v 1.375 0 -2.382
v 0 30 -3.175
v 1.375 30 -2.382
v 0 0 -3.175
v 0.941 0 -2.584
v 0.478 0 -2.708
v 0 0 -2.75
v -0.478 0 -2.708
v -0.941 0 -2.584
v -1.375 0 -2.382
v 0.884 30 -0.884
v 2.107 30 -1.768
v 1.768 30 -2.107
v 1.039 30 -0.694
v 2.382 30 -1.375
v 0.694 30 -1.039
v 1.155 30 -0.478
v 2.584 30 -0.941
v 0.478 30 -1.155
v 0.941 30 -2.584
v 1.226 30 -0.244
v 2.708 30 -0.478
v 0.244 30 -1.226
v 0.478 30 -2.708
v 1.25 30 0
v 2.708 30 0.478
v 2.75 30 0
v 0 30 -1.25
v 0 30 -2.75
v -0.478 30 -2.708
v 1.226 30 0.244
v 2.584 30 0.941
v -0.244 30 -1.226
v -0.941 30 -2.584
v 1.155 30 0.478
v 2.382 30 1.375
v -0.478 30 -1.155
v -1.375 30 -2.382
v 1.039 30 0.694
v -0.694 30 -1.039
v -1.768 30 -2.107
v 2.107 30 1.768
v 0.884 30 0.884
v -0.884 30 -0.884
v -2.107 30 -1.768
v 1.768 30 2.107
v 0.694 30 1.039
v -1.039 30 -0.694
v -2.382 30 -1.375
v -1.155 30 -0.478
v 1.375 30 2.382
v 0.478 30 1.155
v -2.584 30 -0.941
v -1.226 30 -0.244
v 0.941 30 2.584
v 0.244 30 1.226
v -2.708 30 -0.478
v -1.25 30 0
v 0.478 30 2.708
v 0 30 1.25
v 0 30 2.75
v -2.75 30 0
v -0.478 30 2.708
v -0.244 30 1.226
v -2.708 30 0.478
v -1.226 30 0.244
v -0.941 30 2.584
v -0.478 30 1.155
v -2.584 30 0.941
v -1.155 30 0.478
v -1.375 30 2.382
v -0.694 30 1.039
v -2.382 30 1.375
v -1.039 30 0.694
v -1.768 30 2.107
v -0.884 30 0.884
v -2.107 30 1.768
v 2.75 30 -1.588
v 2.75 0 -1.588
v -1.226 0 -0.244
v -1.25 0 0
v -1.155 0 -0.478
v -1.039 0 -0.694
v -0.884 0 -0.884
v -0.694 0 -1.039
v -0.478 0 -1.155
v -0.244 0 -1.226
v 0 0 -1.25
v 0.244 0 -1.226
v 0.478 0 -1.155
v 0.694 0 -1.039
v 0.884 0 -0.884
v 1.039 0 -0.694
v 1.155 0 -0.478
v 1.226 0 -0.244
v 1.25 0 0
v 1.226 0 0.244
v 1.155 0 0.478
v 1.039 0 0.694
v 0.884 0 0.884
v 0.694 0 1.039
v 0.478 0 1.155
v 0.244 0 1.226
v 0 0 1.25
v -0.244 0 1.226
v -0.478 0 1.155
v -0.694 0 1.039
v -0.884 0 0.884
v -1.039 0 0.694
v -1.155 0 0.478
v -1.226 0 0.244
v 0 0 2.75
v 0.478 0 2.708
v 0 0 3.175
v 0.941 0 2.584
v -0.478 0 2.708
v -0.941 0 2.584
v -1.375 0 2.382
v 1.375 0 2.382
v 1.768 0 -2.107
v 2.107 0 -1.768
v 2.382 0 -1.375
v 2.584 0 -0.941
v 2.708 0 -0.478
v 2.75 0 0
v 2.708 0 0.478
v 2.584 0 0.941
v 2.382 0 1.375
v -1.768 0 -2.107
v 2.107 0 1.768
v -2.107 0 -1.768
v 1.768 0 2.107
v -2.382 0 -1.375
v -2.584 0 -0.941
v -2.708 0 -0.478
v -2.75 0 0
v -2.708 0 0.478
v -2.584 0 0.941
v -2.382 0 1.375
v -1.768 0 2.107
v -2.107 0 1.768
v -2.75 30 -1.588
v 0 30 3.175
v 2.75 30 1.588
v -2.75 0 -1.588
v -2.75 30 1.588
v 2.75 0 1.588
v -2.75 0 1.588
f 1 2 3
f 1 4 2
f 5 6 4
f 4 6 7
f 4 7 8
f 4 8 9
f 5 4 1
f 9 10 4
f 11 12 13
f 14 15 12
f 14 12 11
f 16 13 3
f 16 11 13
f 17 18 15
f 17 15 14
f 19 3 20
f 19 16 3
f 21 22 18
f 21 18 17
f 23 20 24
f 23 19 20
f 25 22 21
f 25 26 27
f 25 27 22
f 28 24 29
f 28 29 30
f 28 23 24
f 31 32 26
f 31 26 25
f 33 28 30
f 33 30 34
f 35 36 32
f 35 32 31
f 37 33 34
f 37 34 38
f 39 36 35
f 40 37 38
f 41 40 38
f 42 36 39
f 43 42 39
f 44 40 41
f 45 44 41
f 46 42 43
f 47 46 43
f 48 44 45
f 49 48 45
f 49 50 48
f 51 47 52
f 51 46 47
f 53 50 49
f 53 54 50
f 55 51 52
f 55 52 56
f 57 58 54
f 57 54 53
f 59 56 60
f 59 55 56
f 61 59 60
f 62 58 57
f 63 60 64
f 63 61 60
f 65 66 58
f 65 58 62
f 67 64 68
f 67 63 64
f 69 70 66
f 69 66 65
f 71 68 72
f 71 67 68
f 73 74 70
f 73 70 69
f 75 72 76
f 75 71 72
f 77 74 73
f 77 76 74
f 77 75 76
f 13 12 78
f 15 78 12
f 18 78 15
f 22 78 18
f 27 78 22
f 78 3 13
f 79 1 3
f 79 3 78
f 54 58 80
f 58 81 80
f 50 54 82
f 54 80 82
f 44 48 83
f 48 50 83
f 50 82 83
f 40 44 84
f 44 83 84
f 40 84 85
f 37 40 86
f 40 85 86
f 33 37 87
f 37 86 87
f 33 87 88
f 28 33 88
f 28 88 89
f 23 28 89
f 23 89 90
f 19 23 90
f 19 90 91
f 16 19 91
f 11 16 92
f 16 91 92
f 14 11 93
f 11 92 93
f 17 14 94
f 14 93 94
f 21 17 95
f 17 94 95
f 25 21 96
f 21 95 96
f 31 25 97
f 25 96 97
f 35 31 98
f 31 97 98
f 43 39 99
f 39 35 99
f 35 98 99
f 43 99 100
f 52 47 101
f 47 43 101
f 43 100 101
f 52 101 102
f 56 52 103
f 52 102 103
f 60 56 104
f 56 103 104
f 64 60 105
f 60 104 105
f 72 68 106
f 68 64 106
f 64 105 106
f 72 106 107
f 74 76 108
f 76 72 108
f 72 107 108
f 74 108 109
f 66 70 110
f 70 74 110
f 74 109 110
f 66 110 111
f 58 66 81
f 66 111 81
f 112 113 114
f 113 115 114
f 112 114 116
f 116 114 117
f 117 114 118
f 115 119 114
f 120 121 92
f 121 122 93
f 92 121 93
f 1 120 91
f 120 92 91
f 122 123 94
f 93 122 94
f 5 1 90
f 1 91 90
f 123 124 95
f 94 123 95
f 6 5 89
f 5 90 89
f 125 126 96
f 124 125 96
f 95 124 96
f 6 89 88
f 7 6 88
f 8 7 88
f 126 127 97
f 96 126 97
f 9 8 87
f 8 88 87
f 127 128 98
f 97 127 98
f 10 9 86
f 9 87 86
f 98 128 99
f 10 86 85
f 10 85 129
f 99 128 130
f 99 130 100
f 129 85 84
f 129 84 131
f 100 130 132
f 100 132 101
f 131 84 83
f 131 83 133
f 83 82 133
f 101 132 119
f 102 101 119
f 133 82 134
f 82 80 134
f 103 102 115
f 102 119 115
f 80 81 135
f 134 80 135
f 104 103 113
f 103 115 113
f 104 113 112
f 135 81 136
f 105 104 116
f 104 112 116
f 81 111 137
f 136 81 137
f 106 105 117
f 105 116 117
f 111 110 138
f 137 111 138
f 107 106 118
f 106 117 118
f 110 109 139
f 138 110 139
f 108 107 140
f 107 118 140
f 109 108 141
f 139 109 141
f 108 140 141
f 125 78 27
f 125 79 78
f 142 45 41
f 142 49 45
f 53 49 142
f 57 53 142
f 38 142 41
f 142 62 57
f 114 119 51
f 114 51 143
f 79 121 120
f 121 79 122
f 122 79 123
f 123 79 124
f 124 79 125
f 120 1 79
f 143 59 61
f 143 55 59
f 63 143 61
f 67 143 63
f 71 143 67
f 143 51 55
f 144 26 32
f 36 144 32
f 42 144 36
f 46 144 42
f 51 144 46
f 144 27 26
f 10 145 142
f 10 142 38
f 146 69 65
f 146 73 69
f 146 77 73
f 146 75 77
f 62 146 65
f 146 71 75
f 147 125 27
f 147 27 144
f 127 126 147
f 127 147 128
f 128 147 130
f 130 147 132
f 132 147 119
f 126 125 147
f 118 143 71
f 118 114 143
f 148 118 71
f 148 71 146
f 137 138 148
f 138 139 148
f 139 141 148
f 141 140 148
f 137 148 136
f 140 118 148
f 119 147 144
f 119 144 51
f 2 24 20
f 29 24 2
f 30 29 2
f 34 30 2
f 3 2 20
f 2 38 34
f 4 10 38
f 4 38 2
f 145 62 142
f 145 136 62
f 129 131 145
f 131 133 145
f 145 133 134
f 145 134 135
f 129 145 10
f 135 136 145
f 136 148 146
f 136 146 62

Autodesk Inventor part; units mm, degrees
ref_plane "YZ Plane" through (0, 0, 0) normal (1, 0, 0) x (0, 1, 0)
ref_plane "XZ Plane" through (0, 0, 0) normal (0, 1, 0) x (-1, 0, 0)
ref_plane "XY Plane" through (0, 0, 0) normal (0, 0, 1) x (1, 0, 0)
sketch "Sketch1" plane through (0, 0, 0) normal (0, 1, 0) x (-1, 0, 0)
  circle A0 centre (0, 0) radius 2.75
  line L0 (2.75, -1.5877) -> (0, -3.1754)
  line L1 (0, -3.1754) -> (-2.75, -1.5877)
  line L2 (-2.75, -1.5877) -> (-2.75, 1.5877)
  line L3 (-2.75, 1.5877) -> (0, 3.1754)
  line L4 (0, 3.1754) -> (2.75, 1.5877)
  line L5 (2.75, 1.5877) -> (2.75, -1.5877)
  circle A1 centre (0, 0) radius 1.25
  point P0 (2.75, 0)
  dimension "d0" = 5.5
  dimension "d1" = 2.5
extrude "Extrusion1" add sketch "Sketch1" along normal blind 30
thread "Thread1" size "M3x0.5" class "6H" standard "ANSI Metric M Profile" full length
properties part number "Distance_M3_30" material "Nickel-Copper Alloy 400"
